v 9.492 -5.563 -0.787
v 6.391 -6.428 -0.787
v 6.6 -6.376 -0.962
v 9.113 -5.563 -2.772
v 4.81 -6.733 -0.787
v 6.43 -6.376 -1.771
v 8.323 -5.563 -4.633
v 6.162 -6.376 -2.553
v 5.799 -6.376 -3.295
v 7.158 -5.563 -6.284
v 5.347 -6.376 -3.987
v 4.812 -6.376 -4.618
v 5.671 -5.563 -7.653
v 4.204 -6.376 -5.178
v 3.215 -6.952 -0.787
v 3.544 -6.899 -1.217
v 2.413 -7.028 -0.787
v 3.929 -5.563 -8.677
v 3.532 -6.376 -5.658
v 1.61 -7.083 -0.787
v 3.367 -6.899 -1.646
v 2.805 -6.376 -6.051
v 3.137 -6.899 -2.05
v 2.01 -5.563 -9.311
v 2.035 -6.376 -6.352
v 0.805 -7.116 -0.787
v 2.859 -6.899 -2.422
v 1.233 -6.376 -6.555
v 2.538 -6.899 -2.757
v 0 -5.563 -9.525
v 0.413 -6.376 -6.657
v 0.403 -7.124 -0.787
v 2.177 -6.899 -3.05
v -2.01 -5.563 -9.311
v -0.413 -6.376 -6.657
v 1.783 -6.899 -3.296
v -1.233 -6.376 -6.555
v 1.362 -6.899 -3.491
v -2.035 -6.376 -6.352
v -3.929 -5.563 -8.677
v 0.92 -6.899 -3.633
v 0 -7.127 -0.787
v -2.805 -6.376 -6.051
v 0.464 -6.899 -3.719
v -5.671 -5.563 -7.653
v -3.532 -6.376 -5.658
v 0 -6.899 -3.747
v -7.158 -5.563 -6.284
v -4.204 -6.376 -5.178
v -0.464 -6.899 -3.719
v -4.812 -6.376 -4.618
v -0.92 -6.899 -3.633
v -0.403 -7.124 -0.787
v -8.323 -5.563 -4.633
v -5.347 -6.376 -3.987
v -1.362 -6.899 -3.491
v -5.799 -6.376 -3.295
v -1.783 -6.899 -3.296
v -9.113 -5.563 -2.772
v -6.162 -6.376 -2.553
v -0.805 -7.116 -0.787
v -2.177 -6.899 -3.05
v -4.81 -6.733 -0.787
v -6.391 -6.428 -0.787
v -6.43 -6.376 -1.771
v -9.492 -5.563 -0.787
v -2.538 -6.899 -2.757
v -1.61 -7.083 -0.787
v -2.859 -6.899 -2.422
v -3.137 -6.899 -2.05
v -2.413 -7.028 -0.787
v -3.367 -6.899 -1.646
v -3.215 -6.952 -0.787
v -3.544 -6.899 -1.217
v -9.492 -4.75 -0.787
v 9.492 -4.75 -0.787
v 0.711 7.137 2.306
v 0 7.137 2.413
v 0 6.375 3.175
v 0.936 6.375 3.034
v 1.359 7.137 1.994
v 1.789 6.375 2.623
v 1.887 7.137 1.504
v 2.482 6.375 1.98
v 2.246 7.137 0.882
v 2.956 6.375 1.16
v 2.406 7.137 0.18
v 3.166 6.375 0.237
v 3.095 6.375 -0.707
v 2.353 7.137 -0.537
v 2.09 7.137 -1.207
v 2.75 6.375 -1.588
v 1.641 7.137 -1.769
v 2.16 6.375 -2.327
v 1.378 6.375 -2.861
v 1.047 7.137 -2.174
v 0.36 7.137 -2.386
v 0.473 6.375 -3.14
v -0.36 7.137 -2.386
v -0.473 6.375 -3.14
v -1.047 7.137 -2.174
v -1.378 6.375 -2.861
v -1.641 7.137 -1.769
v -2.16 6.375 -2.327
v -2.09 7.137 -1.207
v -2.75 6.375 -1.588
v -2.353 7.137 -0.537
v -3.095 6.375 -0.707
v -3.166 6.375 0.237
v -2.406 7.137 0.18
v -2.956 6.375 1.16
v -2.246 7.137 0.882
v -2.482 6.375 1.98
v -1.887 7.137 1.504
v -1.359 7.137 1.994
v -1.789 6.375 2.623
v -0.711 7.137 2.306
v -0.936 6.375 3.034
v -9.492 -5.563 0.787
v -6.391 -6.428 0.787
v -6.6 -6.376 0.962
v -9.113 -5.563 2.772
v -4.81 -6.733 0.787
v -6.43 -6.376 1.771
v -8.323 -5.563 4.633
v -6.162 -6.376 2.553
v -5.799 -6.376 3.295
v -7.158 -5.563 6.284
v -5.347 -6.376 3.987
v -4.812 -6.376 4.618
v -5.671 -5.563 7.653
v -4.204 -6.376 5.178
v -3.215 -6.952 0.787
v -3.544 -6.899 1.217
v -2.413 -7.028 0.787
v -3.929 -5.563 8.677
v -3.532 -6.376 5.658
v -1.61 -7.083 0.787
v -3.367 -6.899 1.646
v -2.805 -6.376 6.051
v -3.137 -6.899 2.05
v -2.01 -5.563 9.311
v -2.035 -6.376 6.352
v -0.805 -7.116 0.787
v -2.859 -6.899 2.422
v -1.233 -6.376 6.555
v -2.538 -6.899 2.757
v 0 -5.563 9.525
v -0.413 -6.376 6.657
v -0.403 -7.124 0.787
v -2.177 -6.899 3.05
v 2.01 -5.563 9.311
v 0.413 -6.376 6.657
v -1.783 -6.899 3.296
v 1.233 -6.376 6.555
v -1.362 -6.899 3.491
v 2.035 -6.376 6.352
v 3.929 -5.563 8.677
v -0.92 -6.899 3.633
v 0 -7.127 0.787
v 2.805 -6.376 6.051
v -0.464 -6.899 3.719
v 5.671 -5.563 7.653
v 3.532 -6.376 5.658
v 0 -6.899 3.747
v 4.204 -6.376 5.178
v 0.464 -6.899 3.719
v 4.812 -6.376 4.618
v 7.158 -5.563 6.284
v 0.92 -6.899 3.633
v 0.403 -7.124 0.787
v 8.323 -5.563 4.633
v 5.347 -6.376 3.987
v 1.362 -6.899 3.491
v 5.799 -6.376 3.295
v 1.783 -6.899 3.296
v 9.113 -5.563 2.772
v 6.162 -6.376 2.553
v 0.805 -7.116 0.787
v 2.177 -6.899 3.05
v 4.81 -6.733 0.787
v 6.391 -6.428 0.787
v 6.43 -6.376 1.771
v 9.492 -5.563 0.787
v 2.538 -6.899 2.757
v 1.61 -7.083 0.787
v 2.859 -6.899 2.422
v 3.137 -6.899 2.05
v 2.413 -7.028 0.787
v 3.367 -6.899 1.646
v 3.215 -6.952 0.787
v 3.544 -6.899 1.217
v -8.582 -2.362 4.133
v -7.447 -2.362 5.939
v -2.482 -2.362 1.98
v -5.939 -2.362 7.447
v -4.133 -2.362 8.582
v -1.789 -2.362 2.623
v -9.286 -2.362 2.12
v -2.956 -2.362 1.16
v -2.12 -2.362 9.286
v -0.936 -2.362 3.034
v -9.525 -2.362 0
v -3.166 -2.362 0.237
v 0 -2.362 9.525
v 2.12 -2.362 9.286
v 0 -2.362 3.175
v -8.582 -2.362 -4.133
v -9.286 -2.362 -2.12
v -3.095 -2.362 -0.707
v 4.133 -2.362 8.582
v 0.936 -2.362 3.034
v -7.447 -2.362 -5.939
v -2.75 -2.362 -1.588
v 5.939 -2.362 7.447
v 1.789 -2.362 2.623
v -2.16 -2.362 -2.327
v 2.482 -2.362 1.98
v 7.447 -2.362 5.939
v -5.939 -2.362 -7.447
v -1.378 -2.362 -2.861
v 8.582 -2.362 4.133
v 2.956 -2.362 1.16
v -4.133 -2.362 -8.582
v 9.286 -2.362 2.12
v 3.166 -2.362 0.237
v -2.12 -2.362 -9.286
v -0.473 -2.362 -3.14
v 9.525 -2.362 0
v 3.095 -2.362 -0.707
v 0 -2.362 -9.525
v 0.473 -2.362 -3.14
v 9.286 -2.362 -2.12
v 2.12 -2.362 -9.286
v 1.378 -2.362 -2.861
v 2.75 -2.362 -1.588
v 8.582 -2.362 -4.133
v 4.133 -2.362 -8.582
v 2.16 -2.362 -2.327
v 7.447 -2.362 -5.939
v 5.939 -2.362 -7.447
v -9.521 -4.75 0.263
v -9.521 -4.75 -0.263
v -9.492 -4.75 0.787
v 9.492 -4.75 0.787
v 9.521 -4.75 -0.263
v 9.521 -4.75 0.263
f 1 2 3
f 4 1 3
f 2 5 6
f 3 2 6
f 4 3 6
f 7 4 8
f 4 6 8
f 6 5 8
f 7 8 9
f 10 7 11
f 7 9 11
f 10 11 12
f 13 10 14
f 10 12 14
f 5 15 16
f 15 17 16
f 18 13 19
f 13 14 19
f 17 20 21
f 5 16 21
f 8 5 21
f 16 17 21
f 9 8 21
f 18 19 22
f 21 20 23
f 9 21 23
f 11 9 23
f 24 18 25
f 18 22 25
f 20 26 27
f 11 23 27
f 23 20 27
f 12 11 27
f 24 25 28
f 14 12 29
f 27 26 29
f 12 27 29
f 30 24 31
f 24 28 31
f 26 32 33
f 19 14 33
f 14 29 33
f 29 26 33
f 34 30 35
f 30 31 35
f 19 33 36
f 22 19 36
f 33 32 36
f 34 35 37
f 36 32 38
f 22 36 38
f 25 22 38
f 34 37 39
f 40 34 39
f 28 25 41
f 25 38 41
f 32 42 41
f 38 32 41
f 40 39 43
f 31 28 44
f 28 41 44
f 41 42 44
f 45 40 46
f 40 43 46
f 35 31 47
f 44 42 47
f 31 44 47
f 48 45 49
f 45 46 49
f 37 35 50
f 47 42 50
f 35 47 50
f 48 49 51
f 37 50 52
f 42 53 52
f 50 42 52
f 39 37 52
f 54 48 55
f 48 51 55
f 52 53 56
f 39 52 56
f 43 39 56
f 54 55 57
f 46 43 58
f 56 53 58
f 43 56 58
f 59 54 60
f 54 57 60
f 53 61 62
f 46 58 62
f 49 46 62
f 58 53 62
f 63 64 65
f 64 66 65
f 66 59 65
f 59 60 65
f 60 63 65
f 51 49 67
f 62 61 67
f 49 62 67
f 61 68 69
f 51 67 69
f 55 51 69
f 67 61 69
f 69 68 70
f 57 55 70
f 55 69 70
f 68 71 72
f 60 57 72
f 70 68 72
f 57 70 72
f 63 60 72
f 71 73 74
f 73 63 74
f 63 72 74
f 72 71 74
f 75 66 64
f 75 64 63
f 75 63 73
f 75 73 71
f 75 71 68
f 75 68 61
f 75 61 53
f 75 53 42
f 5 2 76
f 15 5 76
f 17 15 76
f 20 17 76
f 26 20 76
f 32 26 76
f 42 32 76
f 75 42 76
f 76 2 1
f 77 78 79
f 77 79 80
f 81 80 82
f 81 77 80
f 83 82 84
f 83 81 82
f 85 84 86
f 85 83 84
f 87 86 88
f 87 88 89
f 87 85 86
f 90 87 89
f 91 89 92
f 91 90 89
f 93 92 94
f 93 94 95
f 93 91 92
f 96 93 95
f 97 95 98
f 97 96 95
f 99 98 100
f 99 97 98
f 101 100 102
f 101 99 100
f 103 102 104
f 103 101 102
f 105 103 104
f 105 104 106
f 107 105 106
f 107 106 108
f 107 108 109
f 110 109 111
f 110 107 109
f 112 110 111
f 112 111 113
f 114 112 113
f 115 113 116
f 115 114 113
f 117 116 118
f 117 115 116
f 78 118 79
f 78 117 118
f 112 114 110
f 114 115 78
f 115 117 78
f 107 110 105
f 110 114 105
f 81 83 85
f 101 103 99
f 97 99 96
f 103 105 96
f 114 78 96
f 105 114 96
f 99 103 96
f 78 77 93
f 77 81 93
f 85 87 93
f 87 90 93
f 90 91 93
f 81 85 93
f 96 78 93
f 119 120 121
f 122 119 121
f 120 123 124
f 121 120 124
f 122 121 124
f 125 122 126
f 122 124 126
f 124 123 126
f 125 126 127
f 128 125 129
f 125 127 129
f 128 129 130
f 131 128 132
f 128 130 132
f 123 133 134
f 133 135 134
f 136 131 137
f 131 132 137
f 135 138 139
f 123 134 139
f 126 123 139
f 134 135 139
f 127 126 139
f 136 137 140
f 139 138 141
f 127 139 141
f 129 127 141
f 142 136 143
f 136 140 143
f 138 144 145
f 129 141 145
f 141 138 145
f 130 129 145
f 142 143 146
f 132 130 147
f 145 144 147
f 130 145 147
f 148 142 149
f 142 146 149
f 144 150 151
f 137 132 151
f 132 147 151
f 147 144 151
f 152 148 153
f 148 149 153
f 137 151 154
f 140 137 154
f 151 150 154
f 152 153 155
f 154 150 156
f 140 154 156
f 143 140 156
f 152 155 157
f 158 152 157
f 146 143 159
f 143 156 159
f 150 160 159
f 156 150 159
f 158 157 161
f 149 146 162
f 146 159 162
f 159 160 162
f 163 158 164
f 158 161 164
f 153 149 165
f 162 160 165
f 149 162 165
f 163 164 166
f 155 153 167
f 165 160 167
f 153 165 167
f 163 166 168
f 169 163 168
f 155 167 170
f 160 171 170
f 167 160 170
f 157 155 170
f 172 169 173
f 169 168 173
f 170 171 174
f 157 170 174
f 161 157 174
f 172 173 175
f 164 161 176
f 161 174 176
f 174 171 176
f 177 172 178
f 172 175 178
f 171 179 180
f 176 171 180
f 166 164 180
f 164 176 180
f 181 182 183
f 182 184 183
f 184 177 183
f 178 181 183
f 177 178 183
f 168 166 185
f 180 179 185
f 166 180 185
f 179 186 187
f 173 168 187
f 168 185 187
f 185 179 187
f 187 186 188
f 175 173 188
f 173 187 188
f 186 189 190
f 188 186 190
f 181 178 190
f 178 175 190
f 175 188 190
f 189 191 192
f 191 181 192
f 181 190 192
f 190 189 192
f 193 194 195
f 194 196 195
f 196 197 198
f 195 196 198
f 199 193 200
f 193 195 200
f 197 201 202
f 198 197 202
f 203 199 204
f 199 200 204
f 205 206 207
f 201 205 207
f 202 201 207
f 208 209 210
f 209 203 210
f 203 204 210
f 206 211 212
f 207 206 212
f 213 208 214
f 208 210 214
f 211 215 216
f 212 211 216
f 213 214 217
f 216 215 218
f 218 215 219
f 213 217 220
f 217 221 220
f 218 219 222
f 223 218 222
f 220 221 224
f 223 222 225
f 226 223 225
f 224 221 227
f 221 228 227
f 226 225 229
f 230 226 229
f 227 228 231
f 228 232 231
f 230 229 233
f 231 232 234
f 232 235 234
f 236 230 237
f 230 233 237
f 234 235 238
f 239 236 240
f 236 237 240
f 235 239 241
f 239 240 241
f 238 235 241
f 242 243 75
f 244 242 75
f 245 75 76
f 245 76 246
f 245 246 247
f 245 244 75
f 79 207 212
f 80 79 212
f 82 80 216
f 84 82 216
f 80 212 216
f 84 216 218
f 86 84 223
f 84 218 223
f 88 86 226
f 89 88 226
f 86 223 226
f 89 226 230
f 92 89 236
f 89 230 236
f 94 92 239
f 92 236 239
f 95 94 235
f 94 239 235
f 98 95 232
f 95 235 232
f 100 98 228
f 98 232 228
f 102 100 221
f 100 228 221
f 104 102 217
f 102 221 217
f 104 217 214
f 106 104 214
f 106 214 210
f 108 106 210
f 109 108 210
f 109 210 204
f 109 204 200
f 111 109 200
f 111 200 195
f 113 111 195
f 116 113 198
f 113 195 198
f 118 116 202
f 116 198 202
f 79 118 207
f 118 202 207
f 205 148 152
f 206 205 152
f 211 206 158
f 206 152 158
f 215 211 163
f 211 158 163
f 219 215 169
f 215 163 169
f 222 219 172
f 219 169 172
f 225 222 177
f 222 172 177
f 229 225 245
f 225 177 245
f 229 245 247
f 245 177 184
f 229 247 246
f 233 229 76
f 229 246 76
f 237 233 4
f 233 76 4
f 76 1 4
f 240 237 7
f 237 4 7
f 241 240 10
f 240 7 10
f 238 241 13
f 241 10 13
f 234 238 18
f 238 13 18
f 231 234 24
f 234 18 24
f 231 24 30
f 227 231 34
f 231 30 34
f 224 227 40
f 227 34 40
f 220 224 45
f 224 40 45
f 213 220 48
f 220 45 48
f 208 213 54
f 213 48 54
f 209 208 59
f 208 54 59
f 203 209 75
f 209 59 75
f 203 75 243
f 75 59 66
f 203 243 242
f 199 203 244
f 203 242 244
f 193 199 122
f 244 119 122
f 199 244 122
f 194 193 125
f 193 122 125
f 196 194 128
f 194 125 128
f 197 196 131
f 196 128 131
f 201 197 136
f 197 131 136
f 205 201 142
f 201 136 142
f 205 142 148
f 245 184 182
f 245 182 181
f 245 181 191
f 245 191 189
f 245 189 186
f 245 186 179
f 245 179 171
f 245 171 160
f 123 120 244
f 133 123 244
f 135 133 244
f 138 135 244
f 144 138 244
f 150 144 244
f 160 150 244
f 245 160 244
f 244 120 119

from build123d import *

# Parameters (mm, degrees)
F4_DEPTH = 2.3876
F5_SIZE2 = 0.762
F5_SIZE  = 0.762


with BuildPart() as f1:
    # F0 (on Right) → F1 (revolve)
    with BuildSketch(Plane.YZ):
        with BuildLine():
            ThreePointArc((-5.5626, 9.525), (-6.7410456972, 4.8271528886), (-7.1374, 0))
            Line((-7.1374, 0), (7.1374, 0))
            Line((7.1374, 0), (7.1374, 3.175))
            Line((7.1374, 3.175), (-2.3622, 3.175))
            Line((-2.3622, 3.175), (-2.3622, 9.525))
            Line((-2.3622, 9.525), (-5.5626, 9.525))
        make_face()
    revolve(axis=Axis((0, 0, 0), (0, 1, 0)))

    # F3 (on offset) → F4 (cut)
    with BuildSketch(Plane.XZ.offset(7.1374)):
        with BuildLine():
            Line((9.4923983397, 0.7874), (-9.4923983397, 0.7874))
            ThreePointArc((-9.4923983397, 0.7874), (-9.525, 0), (-9.4923983397, -0.7874))
            Line((-9.4923983397, -0.7874), (9.4923983397, -0.7874))
            ThreePointArc((9.4923983397, -0.7874), (9.525, 0), (9.4923983397, 0.7874))
        make_face()
    extrude(amount=-F4_DEPTH, mode=Mode.SUBTRACT)

    # F5
    f5_edges = [f1.edges().sort_by_distance(p)[0] for p in [
        (0, 7.1374, -3.175),
    ]]
    chamfer(f5_edges, length=F5_SIZE, length2=F5_SIZE2)


solid = f1.part
